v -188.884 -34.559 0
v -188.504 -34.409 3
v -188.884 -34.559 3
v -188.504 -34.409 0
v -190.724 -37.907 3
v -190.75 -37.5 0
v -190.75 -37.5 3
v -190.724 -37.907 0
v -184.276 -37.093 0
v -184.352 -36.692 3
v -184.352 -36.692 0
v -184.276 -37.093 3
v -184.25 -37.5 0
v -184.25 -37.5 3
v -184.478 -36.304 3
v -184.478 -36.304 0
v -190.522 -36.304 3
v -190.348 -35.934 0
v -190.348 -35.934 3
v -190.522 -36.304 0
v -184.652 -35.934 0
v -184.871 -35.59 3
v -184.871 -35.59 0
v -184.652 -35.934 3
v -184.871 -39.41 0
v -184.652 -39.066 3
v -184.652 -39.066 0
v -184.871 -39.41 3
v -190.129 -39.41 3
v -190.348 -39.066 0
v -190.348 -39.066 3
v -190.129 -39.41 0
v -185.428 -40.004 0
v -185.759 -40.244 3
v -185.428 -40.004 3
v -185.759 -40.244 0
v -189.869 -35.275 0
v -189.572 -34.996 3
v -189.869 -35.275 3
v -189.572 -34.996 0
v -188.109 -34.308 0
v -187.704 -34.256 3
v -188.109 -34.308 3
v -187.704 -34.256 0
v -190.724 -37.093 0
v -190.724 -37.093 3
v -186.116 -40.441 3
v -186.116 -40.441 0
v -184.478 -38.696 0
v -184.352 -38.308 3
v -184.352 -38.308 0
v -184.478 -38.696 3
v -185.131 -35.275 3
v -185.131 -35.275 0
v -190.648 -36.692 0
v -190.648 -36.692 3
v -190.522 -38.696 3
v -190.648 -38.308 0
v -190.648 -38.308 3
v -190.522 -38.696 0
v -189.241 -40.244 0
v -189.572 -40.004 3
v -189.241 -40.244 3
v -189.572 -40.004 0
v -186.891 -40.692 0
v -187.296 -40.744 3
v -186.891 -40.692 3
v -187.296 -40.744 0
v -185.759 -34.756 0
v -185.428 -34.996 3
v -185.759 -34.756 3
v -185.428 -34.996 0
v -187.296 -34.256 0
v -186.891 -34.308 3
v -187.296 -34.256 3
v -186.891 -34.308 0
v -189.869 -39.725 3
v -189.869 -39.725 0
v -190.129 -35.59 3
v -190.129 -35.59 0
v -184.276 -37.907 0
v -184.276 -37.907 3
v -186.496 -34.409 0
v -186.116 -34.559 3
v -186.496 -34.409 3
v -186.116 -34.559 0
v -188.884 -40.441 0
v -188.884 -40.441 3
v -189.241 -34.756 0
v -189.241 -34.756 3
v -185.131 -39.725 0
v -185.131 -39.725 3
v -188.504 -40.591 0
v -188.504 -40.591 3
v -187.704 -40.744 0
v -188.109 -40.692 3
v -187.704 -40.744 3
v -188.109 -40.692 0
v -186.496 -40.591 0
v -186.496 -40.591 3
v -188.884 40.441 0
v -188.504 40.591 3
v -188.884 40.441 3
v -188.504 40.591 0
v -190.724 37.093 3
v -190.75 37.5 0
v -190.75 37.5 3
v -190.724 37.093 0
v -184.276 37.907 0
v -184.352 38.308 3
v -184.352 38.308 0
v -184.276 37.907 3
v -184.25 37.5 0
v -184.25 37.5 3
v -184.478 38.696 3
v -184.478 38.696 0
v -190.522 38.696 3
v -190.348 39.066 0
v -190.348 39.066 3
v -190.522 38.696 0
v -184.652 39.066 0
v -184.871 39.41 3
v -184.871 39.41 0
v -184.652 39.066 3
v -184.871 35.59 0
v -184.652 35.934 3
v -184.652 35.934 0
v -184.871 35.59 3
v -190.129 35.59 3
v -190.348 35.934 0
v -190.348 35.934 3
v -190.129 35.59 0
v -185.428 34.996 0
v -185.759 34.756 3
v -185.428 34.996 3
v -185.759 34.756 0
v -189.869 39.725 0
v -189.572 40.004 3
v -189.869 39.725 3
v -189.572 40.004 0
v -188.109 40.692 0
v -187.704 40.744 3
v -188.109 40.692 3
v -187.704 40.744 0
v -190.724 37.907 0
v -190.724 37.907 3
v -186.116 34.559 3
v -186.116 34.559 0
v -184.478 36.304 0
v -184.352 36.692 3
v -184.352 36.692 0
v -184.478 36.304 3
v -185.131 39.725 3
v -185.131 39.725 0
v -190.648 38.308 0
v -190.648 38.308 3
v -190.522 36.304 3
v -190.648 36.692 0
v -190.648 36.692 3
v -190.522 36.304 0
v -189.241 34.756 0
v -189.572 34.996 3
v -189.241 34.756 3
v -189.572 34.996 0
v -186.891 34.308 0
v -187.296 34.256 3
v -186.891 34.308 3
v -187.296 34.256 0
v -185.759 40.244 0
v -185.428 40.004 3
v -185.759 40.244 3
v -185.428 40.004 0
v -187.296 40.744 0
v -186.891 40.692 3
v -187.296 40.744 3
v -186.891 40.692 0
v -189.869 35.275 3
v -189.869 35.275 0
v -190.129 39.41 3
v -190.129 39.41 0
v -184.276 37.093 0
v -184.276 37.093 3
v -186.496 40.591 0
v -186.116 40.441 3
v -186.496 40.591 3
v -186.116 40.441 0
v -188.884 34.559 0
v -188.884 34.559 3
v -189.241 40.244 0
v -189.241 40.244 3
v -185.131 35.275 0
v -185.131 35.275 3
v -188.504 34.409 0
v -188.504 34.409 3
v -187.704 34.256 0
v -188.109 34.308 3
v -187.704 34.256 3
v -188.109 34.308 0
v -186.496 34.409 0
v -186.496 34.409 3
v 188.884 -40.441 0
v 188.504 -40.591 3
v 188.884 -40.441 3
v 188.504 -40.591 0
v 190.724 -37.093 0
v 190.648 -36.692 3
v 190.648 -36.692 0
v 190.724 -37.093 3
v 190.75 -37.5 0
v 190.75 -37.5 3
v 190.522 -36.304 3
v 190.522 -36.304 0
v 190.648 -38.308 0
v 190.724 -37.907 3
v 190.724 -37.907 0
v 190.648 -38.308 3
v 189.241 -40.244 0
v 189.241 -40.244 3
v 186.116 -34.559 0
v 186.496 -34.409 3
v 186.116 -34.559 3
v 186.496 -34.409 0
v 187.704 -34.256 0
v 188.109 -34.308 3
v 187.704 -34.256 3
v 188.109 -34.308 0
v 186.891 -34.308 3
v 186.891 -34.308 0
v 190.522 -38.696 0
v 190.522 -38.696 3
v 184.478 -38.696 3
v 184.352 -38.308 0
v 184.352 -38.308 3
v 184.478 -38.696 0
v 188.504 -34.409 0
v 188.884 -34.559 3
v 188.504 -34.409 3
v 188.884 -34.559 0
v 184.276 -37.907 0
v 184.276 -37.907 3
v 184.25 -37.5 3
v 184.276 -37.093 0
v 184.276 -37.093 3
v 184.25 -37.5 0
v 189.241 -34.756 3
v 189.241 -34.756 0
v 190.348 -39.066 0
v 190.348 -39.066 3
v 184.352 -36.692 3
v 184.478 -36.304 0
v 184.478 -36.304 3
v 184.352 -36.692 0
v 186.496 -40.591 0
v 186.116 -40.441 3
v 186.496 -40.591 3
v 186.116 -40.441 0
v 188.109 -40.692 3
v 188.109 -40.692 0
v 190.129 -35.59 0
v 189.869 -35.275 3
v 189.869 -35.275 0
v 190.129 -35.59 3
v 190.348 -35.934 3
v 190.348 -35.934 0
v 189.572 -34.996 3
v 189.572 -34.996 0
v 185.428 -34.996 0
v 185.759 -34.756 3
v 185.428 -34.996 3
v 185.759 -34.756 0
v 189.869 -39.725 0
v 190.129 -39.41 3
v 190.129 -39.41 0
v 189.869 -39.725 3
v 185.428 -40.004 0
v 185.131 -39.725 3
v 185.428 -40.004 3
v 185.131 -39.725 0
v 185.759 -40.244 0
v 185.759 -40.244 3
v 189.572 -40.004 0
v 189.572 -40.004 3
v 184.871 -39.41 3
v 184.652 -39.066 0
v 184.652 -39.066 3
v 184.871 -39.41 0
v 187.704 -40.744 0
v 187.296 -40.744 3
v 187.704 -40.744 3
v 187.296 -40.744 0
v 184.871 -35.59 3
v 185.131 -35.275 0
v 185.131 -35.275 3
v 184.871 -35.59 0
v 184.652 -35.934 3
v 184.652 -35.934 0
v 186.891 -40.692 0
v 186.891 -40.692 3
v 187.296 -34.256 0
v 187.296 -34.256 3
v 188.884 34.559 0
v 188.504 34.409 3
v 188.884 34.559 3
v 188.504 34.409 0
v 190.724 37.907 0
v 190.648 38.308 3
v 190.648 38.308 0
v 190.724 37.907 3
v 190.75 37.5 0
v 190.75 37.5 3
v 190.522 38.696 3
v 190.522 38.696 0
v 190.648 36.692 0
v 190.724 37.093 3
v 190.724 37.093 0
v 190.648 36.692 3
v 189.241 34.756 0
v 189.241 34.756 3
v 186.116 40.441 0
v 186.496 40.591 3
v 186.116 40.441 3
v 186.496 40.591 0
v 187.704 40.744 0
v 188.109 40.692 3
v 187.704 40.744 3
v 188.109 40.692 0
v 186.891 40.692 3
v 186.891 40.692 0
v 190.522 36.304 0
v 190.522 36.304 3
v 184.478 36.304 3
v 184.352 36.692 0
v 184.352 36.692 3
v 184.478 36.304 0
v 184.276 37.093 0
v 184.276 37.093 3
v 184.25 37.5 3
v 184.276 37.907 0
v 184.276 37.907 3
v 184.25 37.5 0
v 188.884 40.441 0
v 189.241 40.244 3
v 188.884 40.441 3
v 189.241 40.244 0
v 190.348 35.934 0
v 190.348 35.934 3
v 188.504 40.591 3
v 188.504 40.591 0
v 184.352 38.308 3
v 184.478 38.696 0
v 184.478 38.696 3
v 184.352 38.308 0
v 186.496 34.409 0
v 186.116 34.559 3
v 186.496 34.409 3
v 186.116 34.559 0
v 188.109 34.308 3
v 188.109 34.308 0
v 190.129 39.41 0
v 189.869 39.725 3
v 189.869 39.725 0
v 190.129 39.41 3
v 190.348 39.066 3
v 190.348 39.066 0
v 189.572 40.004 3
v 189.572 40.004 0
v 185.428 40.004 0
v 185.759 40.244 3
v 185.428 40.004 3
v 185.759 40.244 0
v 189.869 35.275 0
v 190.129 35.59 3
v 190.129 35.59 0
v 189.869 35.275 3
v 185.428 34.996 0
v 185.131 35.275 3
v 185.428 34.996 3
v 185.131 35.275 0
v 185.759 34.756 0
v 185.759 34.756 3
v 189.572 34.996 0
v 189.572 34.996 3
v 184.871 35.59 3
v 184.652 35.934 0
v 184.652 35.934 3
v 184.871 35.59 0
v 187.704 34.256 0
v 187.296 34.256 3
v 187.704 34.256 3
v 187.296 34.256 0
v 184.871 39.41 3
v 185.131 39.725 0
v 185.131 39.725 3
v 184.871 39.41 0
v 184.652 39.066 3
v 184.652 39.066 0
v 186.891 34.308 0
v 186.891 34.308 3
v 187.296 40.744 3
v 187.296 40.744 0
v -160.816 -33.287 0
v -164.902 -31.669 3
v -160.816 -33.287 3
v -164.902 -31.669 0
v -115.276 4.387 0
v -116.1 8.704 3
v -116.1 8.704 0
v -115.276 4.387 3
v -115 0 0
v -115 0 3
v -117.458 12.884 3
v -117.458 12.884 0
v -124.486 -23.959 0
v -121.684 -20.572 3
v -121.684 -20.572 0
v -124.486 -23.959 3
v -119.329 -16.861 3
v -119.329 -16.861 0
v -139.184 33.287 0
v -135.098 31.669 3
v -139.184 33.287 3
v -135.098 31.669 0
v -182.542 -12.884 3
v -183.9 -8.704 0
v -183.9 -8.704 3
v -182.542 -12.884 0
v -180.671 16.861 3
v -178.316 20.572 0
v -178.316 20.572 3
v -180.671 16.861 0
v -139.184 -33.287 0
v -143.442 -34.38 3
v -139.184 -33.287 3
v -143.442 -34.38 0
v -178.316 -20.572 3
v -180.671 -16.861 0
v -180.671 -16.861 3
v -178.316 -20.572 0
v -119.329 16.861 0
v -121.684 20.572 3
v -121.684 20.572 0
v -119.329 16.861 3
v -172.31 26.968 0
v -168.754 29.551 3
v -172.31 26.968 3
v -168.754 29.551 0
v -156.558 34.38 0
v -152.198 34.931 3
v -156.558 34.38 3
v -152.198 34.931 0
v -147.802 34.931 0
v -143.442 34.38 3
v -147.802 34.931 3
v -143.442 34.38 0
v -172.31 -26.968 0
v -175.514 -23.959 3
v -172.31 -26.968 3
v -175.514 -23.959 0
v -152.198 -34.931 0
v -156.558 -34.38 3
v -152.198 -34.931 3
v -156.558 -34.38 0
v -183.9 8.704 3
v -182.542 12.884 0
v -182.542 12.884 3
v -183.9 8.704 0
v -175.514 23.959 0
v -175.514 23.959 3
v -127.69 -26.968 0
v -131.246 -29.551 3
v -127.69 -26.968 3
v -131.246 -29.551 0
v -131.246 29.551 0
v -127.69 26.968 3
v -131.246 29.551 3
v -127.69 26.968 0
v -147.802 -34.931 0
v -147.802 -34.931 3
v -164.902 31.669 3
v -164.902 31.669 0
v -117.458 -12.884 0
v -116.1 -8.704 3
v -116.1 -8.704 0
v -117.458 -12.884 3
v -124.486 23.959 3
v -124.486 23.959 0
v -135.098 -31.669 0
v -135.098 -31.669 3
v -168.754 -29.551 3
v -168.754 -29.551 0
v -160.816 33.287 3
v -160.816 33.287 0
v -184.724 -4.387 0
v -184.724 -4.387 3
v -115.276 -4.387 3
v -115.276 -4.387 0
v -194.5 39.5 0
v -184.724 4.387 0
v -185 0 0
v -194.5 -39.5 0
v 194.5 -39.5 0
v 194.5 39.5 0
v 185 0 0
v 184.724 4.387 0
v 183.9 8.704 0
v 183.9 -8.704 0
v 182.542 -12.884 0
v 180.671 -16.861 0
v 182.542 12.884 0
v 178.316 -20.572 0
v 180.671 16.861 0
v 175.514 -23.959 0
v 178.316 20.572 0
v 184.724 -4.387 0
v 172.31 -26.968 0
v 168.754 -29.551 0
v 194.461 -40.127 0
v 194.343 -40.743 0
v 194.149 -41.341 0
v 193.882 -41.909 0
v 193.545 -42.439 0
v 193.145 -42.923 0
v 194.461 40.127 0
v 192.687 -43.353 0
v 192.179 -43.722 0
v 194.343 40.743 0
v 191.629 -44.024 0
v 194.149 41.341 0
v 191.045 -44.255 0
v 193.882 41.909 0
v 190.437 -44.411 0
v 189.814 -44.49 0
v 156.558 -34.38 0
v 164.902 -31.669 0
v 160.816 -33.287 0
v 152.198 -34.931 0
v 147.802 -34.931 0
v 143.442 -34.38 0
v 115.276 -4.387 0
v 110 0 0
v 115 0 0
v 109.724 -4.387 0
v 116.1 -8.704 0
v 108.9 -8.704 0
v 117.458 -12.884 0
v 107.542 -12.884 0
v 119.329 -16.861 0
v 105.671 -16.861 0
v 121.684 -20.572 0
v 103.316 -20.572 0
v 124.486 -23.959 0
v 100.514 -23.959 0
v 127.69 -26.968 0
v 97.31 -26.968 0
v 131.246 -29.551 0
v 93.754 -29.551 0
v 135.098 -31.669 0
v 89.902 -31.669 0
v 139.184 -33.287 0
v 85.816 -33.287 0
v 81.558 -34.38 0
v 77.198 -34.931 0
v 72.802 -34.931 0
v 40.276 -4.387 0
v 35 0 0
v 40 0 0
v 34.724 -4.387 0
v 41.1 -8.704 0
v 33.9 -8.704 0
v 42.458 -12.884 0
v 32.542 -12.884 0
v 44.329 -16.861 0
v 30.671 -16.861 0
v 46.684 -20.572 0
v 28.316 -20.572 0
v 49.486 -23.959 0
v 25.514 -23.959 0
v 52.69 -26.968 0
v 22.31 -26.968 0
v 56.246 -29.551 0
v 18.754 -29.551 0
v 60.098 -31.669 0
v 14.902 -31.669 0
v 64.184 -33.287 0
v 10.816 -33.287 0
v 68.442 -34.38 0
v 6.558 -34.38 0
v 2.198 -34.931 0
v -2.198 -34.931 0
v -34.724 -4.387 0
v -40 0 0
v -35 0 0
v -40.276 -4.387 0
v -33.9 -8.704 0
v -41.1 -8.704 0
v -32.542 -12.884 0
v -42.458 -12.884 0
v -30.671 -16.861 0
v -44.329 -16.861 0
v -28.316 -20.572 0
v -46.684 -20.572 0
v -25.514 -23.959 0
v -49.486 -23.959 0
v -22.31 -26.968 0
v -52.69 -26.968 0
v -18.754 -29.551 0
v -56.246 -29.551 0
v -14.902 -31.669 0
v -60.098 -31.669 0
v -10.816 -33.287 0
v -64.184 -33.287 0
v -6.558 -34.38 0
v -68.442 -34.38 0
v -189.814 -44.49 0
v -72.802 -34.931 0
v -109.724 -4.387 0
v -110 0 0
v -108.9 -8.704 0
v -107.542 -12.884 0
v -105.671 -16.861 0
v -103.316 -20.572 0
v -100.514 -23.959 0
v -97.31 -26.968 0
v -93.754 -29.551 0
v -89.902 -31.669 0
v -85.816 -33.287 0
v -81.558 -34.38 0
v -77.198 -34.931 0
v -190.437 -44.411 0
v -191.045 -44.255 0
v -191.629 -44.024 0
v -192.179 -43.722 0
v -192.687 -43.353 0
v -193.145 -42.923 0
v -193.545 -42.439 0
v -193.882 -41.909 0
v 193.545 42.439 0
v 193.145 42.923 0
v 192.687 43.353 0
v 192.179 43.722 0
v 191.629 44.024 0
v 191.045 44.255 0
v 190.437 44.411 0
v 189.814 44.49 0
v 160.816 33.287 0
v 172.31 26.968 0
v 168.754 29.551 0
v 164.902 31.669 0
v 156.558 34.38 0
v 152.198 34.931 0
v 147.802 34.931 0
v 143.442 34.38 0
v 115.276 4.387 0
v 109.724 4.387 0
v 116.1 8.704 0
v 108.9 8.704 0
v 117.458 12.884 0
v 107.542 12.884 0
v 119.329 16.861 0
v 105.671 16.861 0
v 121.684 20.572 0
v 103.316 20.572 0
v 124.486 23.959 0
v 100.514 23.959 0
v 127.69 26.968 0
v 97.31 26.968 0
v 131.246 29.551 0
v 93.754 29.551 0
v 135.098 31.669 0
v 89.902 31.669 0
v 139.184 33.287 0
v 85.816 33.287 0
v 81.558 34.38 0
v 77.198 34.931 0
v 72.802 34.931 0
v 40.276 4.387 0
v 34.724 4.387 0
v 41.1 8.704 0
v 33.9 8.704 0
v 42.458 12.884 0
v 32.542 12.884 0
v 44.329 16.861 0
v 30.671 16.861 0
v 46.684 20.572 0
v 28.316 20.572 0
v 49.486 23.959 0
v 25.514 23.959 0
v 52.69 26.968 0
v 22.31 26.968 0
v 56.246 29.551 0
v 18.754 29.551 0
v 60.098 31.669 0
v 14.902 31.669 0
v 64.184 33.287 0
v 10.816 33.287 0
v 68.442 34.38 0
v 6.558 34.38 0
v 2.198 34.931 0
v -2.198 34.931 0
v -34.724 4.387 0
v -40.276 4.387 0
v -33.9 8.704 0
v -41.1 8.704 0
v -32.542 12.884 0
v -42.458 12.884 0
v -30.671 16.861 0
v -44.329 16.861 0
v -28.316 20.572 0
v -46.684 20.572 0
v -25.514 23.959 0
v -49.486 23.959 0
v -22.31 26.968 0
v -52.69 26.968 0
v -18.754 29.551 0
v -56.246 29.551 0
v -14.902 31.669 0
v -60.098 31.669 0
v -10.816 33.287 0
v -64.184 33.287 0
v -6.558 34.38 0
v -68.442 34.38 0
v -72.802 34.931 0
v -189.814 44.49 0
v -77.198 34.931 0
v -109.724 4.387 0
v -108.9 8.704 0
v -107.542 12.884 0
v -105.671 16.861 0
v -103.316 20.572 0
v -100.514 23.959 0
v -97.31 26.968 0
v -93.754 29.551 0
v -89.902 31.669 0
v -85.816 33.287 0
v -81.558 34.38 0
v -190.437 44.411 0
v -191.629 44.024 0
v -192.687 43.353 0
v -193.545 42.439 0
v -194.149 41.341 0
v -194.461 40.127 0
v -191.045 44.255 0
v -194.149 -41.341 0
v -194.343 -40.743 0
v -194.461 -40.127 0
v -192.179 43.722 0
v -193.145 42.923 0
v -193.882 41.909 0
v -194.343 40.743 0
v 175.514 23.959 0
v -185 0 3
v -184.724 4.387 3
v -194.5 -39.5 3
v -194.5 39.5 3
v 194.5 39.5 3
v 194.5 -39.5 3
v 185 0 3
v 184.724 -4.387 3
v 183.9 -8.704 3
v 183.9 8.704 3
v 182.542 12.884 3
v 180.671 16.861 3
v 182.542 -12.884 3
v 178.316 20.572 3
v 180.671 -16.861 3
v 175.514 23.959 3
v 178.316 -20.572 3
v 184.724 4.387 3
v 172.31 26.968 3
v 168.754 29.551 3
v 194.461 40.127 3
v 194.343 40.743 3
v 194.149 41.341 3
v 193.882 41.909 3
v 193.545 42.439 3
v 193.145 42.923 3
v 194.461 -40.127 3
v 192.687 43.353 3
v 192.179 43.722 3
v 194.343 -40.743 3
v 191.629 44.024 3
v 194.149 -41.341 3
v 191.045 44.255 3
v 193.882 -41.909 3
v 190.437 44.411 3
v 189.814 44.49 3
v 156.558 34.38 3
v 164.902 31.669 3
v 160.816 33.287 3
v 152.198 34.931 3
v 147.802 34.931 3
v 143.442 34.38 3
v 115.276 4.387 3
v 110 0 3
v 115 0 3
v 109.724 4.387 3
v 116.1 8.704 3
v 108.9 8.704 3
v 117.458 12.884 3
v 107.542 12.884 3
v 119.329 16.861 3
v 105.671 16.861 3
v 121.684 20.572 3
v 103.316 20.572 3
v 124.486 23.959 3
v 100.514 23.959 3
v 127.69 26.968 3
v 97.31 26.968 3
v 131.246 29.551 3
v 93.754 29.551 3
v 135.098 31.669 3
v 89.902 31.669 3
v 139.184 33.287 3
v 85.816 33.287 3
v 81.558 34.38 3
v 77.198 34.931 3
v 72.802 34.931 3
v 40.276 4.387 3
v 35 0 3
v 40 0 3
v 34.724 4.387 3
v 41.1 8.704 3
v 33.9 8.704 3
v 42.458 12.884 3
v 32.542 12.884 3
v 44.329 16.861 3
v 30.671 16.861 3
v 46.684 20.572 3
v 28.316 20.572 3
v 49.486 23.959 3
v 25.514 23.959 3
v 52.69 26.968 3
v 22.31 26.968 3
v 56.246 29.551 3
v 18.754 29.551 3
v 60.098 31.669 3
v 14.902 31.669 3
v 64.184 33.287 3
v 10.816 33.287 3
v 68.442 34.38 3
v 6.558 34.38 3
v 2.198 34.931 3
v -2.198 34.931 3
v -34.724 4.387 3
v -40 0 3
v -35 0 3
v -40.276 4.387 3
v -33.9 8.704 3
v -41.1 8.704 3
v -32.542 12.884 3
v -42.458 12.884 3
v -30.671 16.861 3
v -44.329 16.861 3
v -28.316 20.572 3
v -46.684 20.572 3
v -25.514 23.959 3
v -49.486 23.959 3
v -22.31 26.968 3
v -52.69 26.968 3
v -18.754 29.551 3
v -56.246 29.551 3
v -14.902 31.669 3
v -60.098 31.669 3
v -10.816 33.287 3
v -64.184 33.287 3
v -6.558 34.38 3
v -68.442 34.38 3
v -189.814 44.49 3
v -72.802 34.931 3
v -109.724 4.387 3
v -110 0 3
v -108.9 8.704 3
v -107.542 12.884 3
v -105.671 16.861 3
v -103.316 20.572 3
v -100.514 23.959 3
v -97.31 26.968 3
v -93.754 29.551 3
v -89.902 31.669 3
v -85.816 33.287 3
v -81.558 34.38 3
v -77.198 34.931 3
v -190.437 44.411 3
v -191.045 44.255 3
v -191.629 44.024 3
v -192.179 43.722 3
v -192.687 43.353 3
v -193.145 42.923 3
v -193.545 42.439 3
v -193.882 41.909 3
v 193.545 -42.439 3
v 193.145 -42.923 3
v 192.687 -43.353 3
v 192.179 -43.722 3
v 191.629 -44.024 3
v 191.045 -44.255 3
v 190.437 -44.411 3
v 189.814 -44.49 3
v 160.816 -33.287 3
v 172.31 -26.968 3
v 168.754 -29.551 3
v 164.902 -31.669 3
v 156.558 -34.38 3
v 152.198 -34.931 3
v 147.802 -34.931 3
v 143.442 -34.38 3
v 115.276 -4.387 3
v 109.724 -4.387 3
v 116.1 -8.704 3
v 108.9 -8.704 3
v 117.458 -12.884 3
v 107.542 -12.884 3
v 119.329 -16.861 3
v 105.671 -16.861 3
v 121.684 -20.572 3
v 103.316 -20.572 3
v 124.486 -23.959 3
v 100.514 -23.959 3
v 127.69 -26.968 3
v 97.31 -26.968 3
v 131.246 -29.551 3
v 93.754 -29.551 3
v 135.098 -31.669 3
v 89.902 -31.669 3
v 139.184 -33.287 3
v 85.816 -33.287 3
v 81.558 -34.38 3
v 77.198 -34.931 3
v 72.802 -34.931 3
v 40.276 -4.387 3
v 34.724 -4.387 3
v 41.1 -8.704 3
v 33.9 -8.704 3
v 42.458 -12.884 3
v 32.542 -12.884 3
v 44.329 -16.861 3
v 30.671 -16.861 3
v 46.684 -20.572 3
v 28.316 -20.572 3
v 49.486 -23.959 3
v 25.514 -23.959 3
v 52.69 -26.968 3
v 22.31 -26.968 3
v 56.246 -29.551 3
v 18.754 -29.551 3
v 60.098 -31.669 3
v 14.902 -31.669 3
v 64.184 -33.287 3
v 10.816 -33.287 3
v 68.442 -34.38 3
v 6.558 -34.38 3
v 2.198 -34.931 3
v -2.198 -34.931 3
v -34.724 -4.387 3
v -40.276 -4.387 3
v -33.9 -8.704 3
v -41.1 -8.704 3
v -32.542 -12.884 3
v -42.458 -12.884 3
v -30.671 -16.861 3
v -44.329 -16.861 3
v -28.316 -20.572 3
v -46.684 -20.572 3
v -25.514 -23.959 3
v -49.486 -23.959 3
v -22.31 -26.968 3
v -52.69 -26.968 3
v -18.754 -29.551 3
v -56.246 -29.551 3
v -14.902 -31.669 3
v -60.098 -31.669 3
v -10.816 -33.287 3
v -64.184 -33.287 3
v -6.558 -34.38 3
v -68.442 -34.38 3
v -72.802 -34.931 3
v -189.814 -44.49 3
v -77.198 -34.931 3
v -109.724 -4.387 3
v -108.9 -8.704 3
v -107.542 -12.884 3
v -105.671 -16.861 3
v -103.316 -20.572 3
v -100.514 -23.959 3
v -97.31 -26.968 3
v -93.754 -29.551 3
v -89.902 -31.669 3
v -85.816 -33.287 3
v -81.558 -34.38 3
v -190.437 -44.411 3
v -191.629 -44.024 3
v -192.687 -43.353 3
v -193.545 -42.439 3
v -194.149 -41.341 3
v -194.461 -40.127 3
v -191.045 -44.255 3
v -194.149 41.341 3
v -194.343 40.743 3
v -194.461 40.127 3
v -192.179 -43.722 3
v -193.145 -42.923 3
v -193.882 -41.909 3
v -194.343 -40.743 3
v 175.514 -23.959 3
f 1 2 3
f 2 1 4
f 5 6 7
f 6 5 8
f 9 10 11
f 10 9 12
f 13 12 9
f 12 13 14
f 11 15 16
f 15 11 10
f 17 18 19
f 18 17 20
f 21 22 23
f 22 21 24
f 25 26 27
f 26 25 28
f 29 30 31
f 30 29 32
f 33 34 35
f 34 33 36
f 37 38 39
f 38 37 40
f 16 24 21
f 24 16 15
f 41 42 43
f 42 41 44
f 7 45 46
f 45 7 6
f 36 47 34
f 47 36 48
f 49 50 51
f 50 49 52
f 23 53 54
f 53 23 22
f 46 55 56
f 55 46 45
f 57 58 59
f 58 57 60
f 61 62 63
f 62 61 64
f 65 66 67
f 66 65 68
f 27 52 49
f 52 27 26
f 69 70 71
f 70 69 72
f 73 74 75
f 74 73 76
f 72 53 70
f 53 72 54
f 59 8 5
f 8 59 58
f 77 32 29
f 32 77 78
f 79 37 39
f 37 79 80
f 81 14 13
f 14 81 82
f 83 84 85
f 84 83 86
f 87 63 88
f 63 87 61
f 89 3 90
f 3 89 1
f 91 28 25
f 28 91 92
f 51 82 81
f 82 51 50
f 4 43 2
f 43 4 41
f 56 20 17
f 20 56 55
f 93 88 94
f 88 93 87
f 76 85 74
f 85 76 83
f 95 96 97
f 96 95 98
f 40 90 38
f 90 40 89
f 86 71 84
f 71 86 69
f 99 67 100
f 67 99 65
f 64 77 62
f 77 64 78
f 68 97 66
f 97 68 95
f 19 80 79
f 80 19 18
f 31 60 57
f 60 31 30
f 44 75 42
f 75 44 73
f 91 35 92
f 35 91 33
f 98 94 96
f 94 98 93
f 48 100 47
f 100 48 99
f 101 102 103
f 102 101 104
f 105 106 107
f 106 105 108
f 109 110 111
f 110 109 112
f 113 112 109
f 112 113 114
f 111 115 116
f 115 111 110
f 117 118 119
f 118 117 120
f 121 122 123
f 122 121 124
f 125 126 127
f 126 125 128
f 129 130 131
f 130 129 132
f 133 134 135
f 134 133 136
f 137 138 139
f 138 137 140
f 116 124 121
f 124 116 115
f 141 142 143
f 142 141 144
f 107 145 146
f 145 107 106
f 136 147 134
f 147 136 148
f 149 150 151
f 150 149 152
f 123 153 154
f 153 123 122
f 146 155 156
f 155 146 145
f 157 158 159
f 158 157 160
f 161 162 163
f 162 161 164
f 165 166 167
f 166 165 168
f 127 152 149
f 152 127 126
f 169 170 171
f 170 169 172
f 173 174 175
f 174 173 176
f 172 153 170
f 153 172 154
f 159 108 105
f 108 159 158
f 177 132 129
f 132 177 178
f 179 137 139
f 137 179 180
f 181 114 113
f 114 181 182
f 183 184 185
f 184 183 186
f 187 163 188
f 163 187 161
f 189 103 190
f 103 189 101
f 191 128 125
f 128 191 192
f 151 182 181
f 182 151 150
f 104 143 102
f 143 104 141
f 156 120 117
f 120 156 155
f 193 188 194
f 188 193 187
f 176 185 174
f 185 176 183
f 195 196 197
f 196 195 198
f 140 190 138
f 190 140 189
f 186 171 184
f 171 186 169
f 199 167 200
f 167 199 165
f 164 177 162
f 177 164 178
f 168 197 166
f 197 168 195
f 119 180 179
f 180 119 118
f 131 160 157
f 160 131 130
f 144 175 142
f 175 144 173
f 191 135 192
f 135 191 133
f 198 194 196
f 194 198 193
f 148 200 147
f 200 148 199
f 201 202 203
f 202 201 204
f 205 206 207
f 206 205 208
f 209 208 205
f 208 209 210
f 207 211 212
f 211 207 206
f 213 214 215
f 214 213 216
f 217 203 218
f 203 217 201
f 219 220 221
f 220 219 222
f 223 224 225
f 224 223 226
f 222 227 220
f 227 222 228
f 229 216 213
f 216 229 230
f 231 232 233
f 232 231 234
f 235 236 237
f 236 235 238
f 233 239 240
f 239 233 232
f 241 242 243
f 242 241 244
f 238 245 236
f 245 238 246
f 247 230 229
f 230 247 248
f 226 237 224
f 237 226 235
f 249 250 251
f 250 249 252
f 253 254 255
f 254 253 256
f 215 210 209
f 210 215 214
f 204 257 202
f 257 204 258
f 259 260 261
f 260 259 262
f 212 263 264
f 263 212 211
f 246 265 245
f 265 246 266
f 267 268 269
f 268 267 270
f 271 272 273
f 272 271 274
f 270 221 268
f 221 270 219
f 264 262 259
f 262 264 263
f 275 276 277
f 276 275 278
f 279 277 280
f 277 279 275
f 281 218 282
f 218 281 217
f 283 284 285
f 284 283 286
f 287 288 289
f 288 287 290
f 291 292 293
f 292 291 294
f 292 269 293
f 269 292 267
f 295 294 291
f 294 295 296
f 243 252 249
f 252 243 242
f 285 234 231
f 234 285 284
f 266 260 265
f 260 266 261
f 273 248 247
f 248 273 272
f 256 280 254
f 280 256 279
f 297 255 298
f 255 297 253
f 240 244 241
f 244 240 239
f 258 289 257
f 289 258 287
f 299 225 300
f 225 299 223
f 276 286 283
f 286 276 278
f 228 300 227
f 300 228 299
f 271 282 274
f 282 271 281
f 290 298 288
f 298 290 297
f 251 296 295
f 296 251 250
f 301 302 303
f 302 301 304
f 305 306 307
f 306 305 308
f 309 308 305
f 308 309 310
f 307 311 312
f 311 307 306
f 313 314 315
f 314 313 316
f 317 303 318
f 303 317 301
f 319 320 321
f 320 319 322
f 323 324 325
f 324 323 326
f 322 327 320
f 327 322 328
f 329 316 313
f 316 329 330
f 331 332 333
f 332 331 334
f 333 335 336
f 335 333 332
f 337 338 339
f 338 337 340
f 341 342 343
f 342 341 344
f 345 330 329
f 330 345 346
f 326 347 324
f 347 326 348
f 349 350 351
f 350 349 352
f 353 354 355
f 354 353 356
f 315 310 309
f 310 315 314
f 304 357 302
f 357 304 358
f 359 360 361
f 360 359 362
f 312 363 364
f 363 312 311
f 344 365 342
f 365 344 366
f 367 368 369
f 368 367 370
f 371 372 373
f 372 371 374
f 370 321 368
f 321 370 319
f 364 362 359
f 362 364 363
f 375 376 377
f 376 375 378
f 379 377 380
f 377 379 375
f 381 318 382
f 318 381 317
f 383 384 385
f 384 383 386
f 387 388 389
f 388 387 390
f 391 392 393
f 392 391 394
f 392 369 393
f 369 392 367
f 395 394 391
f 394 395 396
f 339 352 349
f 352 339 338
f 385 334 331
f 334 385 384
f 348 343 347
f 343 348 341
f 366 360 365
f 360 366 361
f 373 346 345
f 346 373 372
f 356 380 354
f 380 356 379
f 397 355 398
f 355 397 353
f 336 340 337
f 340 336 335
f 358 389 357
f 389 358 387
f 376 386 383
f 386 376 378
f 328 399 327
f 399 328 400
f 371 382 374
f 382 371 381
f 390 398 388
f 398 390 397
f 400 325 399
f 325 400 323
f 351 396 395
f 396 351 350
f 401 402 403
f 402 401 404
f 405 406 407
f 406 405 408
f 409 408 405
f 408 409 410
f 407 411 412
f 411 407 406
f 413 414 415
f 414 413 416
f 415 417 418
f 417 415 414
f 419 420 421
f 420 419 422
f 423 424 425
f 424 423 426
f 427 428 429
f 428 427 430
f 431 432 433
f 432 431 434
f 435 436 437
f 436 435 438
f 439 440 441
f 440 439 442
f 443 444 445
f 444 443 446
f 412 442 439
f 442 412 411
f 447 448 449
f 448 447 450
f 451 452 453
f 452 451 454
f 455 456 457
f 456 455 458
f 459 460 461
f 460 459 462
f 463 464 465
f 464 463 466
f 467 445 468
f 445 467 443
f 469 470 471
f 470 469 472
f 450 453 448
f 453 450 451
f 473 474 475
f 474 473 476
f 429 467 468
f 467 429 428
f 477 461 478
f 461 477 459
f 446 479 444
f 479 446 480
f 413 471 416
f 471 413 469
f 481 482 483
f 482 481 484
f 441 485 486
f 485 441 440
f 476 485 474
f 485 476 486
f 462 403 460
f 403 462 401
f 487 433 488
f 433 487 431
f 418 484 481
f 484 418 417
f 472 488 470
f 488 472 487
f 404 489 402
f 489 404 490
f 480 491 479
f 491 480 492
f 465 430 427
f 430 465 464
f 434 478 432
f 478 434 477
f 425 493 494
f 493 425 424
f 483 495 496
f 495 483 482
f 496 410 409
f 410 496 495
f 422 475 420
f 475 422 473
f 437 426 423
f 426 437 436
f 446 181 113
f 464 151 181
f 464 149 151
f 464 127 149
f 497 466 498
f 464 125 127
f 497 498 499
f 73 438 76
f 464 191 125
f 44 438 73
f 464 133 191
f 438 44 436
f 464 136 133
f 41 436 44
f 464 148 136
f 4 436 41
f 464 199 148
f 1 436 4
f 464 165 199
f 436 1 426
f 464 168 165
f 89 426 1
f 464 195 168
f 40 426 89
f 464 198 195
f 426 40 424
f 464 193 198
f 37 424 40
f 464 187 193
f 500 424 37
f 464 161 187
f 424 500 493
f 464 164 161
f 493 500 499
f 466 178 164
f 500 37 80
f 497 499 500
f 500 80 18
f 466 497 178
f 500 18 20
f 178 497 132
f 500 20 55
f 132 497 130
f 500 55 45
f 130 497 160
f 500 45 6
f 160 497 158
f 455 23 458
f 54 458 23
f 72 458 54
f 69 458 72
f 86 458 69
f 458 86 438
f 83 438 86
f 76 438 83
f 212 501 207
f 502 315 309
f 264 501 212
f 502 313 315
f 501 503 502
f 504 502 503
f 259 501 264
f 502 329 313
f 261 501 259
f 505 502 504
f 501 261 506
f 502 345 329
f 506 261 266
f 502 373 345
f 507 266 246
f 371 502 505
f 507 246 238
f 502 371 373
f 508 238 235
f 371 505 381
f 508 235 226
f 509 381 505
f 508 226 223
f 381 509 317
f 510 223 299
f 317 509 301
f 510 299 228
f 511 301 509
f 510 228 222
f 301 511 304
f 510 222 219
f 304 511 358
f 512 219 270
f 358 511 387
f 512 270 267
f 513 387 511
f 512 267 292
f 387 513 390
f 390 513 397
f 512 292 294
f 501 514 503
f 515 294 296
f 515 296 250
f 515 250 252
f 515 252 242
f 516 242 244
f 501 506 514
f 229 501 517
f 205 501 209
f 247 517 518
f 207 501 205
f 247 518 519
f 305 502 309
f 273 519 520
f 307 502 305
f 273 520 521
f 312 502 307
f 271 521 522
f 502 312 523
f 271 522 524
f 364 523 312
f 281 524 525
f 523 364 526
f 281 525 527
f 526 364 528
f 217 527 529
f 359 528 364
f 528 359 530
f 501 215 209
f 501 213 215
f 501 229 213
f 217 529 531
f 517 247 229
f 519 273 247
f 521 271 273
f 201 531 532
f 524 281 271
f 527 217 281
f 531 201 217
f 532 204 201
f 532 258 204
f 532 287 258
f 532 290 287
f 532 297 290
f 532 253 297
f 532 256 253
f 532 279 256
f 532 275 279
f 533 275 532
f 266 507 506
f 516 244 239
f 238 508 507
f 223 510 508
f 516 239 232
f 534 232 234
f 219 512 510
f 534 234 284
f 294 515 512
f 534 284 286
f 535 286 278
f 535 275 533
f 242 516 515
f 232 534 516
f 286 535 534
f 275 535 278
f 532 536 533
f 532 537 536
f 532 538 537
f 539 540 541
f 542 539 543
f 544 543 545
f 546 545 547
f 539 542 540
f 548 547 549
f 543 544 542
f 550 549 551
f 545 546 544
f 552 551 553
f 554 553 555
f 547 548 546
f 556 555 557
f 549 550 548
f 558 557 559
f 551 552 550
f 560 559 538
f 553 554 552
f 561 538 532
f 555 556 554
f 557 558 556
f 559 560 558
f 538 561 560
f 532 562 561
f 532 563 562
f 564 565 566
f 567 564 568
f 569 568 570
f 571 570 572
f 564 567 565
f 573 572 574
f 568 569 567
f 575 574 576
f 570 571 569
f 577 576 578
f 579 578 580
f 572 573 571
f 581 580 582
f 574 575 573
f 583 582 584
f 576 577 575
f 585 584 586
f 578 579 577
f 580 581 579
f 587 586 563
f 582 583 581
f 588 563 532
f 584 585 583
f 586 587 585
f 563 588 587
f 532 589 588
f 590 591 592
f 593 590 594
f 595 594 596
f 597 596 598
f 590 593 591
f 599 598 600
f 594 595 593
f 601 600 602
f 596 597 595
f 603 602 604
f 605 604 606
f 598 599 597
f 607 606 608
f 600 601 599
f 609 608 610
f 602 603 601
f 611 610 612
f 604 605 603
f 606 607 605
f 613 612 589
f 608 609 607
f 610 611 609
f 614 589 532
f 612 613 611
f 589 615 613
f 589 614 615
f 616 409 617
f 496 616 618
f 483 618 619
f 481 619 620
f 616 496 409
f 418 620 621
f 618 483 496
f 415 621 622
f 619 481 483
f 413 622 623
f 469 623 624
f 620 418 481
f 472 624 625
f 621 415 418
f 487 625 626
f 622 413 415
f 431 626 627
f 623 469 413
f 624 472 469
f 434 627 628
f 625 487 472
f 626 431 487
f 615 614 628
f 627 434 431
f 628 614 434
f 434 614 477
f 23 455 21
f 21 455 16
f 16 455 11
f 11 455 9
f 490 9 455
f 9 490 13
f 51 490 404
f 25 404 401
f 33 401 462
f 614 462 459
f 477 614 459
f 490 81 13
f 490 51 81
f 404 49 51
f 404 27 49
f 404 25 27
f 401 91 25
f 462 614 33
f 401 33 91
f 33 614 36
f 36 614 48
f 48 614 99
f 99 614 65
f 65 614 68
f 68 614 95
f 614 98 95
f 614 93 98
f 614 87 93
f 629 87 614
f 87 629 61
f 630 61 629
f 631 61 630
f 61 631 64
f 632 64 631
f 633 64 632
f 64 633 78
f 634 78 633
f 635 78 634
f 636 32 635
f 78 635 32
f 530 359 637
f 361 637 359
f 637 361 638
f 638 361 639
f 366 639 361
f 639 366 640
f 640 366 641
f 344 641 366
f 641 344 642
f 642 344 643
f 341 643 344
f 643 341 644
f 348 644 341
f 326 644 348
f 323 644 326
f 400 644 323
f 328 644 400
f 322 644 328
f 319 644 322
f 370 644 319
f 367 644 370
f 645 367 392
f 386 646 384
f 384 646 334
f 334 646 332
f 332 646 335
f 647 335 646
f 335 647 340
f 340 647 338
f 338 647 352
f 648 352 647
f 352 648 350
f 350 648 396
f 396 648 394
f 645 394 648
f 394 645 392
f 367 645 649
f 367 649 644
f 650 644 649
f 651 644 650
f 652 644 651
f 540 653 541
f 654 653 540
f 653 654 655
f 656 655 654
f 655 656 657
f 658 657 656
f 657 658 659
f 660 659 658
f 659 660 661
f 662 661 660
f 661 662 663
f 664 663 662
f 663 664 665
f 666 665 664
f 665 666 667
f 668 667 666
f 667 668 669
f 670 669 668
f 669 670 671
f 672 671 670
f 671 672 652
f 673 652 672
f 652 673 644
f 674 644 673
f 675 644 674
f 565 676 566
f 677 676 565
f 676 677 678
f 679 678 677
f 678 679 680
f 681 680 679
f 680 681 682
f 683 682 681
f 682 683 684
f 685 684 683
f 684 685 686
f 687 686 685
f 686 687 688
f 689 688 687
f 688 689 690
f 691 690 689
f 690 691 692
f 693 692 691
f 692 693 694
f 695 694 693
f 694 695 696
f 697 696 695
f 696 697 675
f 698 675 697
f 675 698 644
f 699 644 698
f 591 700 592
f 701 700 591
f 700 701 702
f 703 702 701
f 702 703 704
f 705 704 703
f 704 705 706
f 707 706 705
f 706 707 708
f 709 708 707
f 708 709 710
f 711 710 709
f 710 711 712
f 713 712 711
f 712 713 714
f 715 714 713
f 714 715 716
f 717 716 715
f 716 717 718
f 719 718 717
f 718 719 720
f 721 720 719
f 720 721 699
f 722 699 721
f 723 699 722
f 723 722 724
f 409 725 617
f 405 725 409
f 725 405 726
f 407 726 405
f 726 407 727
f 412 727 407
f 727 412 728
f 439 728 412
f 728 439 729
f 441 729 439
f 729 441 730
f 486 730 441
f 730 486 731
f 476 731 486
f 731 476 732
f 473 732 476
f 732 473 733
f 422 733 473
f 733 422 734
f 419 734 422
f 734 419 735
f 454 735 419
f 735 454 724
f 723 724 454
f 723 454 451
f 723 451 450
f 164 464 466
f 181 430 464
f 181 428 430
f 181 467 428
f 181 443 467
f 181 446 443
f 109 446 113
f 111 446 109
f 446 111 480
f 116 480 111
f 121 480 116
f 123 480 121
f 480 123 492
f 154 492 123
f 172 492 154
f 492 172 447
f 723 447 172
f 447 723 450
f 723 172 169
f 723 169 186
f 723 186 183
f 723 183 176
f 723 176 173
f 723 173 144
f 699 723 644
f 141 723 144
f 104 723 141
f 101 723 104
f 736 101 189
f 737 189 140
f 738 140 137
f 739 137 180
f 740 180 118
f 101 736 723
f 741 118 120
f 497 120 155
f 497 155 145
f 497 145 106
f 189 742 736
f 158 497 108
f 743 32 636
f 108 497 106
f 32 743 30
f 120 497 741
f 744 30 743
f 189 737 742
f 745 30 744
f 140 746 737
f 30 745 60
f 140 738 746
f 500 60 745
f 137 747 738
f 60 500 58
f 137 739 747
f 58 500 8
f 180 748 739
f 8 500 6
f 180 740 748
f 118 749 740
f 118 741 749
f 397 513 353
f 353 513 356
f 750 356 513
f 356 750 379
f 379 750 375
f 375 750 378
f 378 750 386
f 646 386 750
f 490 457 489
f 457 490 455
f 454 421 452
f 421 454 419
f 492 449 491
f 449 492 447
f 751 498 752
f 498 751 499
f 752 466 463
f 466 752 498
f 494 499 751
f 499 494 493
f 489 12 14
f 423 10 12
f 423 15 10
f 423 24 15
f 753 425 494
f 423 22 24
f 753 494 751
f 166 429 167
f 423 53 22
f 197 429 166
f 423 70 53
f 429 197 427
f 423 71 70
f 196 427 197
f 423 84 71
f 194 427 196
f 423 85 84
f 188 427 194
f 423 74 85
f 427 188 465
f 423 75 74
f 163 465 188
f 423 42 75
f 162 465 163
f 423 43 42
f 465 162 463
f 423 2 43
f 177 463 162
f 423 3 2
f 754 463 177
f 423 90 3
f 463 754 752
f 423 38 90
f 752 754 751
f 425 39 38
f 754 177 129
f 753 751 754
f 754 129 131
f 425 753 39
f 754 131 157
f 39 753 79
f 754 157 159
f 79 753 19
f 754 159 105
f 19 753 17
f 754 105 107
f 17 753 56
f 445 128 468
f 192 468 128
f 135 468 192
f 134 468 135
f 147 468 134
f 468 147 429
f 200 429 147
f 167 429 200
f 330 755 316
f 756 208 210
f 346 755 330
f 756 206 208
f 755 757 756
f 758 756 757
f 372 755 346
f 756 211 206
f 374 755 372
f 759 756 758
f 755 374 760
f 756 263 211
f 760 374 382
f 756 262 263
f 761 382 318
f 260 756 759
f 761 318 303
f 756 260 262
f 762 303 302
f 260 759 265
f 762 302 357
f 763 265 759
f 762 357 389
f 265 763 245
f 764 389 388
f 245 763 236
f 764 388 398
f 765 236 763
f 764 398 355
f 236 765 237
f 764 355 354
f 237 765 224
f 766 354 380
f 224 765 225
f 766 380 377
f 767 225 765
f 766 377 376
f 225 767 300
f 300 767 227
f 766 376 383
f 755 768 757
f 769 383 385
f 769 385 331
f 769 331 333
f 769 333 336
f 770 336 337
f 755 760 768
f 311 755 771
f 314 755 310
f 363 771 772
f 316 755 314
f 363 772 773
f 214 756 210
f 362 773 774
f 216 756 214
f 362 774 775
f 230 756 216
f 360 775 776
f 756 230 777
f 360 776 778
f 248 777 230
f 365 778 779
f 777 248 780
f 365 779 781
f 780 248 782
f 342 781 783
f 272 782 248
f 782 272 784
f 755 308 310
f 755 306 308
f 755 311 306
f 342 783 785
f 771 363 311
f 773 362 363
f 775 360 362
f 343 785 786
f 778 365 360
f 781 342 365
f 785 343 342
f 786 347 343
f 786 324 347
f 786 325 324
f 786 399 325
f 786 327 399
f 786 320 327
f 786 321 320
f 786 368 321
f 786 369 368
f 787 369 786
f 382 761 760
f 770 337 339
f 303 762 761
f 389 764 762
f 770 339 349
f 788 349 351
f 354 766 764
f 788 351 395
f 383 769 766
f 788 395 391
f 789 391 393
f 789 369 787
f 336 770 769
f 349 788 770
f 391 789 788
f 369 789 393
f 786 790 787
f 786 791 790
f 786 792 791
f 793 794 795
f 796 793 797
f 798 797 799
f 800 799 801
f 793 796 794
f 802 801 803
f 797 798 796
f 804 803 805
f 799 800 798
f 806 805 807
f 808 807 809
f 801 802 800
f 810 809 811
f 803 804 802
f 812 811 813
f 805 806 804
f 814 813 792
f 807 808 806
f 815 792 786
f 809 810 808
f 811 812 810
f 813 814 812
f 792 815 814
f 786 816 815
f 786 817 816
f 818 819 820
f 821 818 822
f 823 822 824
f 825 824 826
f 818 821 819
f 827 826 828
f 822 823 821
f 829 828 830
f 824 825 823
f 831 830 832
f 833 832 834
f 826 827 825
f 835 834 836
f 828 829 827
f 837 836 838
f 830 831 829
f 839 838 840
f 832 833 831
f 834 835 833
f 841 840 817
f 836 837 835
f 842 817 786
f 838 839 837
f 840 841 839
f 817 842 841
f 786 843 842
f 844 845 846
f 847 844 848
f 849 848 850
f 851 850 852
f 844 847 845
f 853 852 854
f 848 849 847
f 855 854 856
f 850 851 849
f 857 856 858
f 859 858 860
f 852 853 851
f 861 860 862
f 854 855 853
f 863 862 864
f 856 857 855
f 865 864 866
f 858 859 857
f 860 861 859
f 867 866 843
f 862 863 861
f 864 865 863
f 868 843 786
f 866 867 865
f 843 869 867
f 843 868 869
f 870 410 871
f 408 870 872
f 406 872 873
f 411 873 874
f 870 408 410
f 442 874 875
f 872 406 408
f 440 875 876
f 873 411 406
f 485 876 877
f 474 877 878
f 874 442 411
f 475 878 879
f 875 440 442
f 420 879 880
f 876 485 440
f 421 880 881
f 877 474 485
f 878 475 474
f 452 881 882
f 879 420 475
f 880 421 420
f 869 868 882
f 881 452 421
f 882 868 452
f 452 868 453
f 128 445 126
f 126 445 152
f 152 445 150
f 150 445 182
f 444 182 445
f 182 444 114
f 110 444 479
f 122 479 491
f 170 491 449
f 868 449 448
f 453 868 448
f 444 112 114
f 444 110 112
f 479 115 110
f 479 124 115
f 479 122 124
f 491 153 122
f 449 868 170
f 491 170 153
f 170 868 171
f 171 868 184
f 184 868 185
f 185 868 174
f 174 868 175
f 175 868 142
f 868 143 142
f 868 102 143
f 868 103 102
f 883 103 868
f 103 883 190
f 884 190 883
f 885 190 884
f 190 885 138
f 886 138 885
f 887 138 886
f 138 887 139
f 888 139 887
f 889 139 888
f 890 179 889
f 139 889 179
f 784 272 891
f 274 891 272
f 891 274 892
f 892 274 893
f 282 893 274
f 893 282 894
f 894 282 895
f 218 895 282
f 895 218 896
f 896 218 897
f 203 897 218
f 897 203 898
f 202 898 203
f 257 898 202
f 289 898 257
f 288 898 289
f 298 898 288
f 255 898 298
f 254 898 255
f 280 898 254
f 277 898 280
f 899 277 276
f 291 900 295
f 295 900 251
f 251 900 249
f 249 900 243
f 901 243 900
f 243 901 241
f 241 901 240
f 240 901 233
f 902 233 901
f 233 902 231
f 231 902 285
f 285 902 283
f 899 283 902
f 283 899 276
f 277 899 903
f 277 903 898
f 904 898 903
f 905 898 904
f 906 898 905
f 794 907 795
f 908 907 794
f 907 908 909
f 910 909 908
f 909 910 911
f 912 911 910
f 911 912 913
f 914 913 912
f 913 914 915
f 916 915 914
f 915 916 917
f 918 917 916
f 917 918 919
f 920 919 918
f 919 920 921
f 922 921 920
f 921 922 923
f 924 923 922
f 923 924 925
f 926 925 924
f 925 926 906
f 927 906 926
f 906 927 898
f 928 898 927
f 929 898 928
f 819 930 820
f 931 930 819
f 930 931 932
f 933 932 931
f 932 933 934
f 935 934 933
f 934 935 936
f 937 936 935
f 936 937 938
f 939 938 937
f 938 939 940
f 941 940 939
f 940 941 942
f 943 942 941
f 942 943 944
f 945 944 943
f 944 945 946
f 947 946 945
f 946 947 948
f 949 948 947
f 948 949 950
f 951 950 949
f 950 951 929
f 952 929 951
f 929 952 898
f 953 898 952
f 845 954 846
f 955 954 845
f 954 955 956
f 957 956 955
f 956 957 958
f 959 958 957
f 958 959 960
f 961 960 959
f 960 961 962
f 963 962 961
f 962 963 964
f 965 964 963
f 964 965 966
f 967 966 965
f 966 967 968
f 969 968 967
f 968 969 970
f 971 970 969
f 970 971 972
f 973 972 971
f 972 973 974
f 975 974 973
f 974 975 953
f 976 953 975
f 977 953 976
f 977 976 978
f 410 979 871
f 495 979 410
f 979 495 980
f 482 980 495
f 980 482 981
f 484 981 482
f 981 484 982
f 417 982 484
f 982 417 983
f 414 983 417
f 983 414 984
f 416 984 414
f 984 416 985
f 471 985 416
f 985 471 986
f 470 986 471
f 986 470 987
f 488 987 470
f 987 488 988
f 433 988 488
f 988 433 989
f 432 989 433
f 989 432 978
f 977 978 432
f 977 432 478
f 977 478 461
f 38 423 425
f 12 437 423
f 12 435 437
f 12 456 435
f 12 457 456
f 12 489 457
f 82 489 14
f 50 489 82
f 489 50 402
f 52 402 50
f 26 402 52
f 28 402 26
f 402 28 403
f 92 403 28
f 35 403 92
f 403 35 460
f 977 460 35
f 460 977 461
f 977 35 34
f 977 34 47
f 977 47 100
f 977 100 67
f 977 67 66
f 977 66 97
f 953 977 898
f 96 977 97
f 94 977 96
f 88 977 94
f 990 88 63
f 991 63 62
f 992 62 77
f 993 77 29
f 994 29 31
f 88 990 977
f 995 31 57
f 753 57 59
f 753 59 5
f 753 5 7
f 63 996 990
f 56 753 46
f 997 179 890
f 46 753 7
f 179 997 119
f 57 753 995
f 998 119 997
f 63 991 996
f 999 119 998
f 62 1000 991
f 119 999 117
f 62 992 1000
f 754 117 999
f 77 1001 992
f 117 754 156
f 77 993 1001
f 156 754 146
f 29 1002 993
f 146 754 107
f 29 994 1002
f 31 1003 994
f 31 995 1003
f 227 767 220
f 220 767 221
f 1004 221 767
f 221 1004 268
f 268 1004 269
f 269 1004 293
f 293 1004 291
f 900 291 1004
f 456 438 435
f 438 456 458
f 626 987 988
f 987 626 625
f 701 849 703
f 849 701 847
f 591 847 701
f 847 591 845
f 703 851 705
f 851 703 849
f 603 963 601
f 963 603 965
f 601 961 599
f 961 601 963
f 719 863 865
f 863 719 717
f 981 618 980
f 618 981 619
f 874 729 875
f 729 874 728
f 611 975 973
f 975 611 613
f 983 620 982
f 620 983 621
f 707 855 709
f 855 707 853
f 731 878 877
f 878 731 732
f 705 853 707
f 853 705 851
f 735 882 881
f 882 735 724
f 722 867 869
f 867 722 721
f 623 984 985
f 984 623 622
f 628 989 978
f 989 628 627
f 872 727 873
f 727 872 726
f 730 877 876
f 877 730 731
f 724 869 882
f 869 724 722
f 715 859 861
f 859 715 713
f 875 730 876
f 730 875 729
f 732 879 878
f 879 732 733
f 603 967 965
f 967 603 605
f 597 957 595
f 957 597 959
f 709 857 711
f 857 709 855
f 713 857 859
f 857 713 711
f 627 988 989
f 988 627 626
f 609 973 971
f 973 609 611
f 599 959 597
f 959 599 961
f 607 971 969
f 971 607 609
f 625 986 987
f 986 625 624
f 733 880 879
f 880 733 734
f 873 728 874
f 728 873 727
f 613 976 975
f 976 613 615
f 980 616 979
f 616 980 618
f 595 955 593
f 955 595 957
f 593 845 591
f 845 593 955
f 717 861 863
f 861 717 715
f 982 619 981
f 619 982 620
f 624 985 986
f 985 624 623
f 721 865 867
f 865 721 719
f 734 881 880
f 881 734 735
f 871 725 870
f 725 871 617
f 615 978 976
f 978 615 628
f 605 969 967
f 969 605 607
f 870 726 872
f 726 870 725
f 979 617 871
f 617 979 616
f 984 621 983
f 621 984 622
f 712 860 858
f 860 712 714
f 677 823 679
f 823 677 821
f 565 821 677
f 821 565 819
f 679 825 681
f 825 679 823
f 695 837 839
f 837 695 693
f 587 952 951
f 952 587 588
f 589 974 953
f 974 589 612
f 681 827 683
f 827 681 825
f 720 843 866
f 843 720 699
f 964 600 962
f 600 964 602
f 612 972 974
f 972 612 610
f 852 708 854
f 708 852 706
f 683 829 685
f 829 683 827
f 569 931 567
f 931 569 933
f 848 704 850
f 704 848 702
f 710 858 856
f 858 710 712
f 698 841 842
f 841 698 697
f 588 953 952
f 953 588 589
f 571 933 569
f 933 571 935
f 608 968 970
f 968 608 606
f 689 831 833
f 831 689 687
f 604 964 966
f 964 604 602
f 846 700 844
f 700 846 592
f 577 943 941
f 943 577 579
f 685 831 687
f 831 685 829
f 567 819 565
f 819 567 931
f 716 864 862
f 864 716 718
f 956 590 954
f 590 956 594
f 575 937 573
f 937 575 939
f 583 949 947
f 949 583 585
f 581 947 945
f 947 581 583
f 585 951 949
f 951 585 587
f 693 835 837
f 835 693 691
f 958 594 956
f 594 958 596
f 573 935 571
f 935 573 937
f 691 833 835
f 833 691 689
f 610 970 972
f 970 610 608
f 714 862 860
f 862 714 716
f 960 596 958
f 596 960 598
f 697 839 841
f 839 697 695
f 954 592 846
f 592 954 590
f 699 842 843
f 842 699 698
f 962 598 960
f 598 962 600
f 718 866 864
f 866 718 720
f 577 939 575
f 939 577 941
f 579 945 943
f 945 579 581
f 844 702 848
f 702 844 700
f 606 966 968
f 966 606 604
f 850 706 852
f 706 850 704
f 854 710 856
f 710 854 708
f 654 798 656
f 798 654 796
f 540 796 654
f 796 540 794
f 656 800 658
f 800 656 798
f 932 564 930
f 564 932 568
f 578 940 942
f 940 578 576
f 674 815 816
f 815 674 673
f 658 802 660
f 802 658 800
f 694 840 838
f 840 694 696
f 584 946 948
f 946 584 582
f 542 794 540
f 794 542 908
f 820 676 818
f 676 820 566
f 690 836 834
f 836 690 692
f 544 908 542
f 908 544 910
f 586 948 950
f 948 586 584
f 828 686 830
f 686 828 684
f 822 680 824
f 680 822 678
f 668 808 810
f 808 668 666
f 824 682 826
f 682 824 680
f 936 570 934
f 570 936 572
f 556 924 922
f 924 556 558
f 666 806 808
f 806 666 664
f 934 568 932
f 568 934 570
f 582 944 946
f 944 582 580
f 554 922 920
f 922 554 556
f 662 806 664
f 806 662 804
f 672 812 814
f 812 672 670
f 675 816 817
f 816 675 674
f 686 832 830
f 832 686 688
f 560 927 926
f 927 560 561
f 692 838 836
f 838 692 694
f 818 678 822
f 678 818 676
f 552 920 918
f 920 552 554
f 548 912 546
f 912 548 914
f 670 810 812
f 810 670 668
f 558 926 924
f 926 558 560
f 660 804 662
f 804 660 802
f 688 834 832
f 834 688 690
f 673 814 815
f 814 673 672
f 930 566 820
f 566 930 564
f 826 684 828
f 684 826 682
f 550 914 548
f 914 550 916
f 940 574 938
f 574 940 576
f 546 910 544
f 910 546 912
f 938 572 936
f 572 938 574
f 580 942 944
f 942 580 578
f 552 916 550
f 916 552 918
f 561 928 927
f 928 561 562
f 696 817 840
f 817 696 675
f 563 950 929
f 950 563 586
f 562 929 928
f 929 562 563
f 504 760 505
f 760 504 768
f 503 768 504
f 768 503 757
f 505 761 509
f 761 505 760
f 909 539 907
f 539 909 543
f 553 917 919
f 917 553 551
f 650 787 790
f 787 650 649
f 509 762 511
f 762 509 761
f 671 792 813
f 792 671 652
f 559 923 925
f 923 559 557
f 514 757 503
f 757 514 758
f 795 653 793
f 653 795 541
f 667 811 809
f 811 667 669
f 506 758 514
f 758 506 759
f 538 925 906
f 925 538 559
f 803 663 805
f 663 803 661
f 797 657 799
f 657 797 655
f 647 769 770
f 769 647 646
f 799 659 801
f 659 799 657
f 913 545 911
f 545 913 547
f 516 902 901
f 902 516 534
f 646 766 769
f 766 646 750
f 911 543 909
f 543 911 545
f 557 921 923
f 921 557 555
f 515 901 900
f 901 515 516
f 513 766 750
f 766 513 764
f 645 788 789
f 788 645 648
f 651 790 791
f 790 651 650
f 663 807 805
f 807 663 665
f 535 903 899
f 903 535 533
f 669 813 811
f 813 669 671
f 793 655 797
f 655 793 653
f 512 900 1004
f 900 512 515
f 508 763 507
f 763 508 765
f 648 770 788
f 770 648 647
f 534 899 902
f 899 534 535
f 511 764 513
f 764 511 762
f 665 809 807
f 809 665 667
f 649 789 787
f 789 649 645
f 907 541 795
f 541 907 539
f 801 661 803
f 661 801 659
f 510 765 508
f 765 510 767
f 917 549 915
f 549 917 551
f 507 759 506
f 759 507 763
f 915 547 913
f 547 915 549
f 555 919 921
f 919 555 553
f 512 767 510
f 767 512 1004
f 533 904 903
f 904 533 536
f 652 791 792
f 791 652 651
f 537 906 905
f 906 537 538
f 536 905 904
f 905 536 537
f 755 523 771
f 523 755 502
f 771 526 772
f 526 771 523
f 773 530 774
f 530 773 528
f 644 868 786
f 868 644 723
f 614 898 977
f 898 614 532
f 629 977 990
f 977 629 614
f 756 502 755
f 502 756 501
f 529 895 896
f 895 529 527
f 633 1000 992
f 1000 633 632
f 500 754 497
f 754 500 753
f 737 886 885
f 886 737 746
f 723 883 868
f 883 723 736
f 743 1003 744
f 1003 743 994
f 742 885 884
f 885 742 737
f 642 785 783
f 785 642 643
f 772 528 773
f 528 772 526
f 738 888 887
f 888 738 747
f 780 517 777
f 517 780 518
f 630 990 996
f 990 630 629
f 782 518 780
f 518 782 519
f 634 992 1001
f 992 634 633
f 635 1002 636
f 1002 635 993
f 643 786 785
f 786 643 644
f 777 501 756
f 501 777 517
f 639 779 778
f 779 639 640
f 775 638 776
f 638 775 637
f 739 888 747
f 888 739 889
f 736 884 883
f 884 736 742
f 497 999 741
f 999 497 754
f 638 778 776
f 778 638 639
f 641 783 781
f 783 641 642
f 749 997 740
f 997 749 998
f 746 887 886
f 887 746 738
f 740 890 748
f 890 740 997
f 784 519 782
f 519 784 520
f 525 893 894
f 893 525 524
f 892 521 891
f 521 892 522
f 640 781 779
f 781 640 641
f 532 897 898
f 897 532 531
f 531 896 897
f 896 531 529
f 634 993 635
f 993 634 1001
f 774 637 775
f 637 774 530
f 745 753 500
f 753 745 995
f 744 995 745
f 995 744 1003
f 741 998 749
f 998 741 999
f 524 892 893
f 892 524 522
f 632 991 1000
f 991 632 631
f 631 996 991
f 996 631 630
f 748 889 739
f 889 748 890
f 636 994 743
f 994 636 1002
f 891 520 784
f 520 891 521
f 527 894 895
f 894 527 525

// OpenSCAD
$fn = 50;

difference() {
	union() {
		hull() {
			translate(v = [-189.5, 39.5, 0]) {
				cylinder(h = 3, r = 5);
			}
			translate(v = [189.5, 39.5, 0]) {
				cylinder(h = 3, r = 5);
			}
			translate(v = [-189.5, -39.5, 0]) {
				cylinder(h = 3, r = 5);
			}
			translate(v = [189.5, -39.5, 0]) {
				cylinder(h = 3, r = 5);
			}
		}
	}
	union() {
		translate(v = [-187.5, -37.5, -100.0]) {
			cylinder(h = 200, r = 3.25);
		}
		translate(v = [-187.5, 37.5, -100.0]) {
			cylinder(h = 200, r = 3.25);
		}
		translate(v = [187.5, -37.5, -100.0]) {
			cylinder(h = 200, r = 3.25);
		}
		translate(v = [187.5, 37.5, -100.0]) {
			cylinder(h = 200, r = 3.25);
		}
		translate(v = [-187.5, -37.5, -100.0]) {
			cylinder(h = 200, r = 1.8);
		}
		translate(v = [-187.5, 37.5, -100.0]) {
			cylinder(h = 200, r = 1.8);
		}
		translate(v = [187.5, -37.5, -100.0]) {
			cylinder(h = 200, r = 1.8);
		}
		translate(v = [187.5, 37.5, -100.0]) {
			cylinder(h = 200, r = 1.8);
		}
		translate(v = [-150.0, 0, 0.0]) {
			cylinder(h = 3, r = 35.0);
		}
		translate(v = [-75.0, 0, 0.0]) {
			cylinder(h = 3, r = 35.0);
		}
		cylinder(h = 3, r = 35.0);
		translate(v = [75.0, 0, 0.0]) {
			cylinder(h = 3, r = 35.0);
		}
		translate(v = [150.0, 0, 0.0]) {
			cylinder(h = 3, r = 35.0);
		}
	}
}
